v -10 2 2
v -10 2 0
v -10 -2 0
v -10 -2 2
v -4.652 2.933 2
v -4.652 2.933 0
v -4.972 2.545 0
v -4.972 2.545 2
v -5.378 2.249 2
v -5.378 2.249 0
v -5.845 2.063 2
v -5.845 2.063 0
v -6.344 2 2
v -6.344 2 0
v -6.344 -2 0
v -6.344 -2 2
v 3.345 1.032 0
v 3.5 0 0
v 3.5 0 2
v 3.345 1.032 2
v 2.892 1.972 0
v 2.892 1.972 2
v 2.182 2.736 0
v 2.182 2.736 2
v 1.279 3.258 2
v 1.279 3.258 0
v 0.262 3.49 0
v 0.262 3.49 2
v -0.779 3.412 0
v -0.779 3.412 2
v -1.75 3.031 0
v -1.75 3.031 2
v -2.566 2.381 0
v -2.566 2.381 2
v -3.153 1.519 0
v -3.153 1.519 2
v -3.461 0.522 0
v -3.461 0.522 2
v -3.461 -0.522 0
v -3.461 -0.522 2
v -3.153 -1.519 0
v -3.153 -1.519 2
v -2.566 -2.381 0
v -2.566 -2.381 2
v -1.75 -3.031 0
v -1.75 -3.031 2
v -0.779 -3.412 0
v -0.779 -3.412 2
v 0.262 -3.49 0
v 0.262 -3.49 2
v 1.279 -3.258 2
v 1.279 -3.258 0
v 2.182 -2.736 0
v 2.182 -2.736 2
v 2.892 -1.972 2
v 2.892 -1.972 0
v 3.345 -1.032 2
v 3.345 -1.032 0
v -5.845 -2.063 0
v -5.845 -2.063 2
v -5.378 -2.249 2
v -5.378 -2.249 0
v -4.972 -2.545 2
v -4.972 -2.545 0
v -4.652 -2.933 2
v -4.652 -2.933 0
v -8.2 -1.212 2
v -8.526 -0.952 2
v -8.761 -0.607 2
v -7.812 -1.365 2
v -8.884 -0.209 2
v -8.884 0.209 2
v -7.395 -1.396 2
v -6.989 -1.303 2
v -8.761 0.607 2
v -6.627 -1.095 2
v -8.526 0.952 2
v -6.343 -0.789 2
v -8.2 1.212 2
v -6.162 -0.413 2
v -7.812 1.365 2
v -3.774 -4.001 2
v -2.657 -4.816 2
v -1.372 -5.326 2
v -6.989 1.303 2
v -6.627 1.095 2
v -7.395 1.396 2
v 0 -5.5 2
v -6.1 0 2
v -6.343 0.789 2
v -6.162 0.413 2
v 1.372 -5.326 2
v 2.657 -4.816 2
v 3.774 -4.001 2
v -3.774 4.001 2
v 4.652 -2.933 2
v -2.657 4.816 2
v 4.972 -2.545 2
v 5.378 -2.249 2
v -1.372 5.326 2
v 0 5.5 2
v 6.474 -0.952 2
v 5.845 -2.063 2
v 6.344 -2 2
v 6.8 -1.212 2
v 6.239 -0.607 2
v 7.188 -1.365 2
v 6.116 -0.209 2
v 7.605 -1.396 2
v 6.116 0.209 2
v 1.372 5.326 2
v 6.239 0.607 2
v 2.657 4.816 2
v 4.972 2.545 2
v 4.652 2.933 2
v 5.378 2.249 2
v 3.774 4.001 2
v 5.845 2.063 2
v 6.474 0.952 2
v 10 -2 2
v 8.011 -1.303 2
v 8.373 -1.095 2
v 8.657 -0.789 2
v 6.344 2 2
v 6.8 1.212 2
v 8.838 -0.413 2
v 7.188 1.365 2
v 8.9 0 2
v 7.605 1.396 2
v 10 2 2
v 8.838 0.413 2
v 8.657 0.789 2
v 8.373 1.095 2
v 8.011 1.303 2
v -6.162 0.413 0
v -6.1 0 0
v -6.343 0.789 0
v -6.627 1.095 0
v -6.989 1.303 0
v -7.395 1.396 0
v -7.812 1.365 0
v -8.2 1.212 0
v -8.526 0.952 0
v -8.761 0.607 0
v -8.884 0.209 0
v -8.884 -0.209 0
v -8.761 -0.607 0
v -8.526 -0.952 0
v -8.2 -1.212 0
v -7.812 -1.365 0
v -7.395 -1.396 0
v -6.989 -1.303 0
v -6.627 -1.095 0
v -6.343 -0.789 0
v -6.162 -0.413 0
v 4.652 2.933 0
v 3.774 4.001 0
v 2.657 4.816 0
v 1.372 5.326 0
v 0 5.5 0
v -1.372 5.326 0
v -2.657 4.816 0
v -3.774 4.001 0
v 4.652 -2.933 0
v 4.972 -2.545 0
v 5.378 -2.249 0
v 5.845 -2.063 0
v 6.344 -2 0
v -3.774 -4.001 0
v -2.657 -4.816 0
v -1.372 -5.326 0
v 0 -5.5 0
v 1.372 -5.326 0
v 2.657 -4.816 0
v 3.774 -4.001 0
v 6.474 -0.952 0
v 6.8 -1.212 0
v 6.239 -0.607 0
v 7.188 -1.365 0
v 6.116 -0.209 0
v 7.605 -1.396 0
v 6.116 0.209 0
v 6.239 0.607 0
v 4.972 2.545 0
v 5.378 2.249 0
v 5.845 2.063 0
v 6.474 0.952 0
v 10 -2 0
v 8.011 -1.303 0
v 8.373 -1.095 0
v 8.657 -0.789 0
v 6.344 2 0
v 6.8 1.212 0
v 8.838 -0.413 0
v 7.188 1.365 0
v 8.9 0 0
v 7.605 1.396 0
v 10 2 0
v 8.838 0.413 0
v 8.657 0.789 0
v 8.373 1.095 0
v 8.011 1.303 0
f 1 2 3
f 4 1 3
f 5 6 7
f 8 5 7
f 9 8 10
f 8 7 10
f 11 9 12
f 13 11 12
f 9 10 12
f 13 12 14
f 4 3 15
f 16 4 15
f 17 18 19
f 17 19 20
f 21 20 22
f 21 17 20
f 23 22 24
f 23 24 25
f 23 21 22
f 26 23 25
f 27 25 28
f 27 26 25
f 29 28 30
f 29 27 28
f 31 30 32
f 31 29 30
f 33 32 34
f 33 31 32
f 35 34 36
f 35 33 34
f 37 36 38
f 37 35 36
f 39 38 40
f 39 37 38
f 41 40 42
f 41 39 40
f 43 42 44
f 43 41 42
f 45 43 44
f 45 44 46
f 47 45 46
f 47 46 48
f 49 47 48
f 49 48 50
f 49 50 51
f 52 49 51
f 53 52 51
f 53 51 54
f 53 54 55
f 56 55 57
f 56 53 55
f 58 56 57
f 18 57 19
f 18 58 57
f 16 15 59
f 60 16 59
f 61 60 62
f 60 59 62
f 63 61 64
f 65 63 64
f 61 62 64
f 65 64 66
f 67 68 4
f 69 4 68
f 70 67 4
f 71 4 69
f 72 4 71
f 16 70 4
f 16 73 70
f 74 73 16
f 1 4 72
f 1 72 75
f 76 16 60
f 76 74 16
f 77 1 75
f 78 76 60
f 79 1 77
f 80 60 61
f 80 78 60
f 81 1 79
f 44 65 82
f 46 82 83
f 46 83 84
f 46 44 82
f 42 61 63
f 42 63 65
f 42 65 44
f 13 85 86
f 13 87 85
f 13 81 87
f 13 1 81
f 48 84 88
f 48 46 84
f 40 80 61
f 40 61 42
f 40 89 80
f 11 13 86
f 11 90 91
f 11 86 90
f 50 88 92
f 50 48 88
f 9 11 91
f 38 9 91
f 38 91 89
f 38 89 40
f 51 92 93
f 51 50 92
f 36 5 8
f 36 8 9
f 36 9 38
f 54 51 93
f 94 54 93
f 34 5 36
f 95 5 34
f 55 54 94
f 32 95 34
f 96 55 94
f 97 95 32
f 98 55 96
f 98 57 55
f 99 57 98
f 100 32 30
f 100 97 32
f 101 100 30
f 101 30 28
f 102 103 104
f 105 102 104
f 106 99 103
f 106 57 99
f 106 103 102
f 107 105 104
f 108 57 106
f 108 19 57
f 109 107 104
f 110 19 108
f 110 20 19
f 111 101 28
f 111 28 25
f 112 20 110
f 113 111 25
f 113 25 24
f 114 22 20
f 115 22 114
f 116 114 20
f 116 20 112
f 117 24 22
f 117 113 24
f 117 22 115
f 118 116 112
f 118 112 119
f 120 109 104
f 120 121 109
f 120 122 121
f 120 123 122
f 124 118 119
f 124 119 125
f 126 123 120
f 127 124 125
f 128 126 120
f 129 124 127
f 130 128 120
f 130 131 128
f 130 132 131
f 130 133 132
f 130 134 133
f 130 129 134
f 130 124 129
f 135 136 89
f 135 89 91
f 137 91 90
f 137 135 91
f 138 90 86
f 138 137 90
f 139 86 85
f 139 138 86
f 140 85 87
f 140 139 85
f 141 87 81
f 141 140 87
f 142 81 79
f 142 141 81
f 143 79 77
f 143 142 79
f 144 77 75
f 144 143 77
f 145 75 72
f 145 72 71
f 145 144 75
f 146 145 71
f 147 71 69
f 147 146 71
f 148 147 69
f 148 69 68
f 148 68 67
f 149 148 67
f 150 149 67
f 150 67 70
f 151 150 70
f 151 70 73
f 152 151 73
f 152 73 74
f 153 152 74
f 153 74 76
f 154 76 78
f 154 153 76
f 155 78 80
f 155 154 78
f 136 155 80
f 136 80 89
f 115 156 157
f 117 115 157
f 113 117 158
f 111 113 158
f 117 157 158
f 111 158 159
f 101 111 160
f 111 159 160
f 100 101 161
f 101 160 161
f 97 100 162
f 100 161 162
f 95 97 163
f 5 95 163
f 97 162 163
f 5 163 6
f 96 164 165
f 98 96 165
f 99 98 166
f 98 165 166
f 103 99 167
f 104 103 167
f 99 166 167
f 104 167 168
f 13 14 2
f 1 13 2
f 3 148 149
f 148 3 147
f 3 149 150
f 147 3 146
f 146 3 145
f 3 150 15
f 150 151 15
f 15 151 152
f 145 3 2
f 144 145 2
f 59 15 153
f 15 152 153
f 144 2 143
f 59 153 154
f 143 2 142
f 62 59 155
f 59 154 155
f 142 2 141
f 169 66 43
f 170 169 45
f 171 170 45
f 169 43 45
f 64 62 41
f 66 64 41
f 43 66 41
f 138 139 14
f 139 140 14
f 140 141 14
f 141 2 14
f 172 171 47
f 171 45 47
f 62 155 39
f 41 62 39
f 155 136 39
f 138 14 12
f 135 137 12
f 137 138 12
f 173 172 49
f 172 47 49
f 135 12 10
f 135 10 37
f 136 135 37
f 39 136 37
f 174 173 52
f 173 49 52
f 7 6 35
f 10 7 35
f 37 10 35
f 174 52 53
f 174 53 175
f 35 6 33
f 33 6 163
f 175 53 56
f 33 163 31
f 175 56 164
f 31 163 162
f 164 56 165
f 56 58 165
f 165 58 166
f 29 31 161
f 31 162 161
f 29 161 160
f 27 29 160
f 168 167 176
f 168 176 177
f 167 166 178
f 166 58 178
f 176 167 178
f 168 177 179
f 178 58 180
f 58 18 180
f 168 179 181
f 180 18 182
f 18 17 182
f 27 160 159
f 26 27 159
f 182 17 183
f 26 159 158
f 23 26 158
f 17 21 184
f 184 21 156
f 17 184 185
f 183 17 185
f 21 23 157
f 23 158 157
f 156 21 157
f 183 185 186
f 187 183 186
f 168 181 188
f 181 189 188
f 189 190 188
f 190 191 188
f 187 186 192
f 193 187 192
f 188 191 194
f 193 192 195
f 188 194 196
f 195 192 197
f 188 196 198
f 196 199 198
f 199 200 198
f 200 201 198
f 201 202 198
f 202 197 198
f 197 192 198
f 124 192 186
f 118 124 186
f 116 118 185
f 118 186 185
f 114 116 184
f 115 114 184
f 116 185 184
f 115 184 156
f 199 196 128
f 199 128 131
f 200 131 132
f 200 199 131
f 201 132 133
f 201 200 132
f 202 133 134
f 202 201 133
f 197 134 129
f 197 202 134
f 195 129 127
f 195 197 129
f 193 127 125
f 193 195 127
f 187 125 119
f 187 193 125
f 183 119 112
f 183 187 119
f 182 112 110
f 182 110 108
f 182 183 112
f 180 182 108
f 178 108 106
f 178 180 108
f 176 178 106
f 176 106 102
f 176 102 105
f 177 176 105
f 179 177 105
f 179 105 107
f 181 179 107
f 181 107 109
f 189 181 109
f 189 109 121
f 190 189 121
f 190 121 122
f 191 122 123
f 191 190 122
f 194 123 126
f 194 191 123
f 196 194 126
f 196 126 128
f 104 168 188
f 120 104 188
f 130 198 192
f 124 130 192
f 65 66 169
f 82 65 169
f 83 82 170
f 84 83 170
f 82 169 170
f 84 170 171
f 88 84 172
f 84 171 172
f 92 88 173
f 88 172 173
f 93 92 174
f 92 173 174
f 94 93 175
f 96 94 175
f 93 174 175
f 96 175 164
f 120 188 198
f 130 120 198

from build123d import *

# Parameters (mm, degrees)
SKETCH_1_R      = 3.5
SKETCH_1_R_2    = 1.4
EXTRUDE_1_DEPTH = 2


with BuildPart() as part:
    # 草图1 → 凸台-拉伸1 (new body)
    with BuildSketch(Plane.XY):
        with BuildLine():
            Line((-10, -2), (-6.34428877, -2))
            ThreePointArc((-6.34428877, -2), (-5.378196987, -2.248809928), (-4.652478431, -2.933333333))
            ThreePointArc((-4.652478431, -2.933333333), (0, -5.5), (4.652478431, -2.933333333))
            ThreePointArc((4.652478431, -2.933333333), (5.378196987, -2.248809928), (6.34428877, -2))
            Line((6.34428877, -2), (10, -2))
            Line((10, -2), (10, 2))
            Line((10, 2), (6.34428877, 2))
            ThreePointArc((6.34428877, 2), (5.378196987, 2.248809928), (4.652478431, 2.933333333))
            ThreePointArc((4.652478431, 2.933333333), (0, 5.5), (-4.652478431, 2.933333333))
            ThreePointArc((-4.652478431, 2.933333333), (-5.378196987, 2.248809928), (-6.34428877, 2))
            Line((-6.34428877, 2), (-10, 2))
            Line((-10, 2), (-10, -2))
        make_face()
        Circle(SKETCH_1_R, mode=Mode.SUBTRACT)
        with Locations((-7.5, 0)):
            Circle(SKETCH_1_R_2, mode=Mode.SUBTRACT)
        with Locations((7.5, 0)):
            Circle(SKETCH_1_R_2, mode=Mode.SUBTRACT)
    extrude(amount=EXTRUDE_1_DEPTH)


solid = part.part
